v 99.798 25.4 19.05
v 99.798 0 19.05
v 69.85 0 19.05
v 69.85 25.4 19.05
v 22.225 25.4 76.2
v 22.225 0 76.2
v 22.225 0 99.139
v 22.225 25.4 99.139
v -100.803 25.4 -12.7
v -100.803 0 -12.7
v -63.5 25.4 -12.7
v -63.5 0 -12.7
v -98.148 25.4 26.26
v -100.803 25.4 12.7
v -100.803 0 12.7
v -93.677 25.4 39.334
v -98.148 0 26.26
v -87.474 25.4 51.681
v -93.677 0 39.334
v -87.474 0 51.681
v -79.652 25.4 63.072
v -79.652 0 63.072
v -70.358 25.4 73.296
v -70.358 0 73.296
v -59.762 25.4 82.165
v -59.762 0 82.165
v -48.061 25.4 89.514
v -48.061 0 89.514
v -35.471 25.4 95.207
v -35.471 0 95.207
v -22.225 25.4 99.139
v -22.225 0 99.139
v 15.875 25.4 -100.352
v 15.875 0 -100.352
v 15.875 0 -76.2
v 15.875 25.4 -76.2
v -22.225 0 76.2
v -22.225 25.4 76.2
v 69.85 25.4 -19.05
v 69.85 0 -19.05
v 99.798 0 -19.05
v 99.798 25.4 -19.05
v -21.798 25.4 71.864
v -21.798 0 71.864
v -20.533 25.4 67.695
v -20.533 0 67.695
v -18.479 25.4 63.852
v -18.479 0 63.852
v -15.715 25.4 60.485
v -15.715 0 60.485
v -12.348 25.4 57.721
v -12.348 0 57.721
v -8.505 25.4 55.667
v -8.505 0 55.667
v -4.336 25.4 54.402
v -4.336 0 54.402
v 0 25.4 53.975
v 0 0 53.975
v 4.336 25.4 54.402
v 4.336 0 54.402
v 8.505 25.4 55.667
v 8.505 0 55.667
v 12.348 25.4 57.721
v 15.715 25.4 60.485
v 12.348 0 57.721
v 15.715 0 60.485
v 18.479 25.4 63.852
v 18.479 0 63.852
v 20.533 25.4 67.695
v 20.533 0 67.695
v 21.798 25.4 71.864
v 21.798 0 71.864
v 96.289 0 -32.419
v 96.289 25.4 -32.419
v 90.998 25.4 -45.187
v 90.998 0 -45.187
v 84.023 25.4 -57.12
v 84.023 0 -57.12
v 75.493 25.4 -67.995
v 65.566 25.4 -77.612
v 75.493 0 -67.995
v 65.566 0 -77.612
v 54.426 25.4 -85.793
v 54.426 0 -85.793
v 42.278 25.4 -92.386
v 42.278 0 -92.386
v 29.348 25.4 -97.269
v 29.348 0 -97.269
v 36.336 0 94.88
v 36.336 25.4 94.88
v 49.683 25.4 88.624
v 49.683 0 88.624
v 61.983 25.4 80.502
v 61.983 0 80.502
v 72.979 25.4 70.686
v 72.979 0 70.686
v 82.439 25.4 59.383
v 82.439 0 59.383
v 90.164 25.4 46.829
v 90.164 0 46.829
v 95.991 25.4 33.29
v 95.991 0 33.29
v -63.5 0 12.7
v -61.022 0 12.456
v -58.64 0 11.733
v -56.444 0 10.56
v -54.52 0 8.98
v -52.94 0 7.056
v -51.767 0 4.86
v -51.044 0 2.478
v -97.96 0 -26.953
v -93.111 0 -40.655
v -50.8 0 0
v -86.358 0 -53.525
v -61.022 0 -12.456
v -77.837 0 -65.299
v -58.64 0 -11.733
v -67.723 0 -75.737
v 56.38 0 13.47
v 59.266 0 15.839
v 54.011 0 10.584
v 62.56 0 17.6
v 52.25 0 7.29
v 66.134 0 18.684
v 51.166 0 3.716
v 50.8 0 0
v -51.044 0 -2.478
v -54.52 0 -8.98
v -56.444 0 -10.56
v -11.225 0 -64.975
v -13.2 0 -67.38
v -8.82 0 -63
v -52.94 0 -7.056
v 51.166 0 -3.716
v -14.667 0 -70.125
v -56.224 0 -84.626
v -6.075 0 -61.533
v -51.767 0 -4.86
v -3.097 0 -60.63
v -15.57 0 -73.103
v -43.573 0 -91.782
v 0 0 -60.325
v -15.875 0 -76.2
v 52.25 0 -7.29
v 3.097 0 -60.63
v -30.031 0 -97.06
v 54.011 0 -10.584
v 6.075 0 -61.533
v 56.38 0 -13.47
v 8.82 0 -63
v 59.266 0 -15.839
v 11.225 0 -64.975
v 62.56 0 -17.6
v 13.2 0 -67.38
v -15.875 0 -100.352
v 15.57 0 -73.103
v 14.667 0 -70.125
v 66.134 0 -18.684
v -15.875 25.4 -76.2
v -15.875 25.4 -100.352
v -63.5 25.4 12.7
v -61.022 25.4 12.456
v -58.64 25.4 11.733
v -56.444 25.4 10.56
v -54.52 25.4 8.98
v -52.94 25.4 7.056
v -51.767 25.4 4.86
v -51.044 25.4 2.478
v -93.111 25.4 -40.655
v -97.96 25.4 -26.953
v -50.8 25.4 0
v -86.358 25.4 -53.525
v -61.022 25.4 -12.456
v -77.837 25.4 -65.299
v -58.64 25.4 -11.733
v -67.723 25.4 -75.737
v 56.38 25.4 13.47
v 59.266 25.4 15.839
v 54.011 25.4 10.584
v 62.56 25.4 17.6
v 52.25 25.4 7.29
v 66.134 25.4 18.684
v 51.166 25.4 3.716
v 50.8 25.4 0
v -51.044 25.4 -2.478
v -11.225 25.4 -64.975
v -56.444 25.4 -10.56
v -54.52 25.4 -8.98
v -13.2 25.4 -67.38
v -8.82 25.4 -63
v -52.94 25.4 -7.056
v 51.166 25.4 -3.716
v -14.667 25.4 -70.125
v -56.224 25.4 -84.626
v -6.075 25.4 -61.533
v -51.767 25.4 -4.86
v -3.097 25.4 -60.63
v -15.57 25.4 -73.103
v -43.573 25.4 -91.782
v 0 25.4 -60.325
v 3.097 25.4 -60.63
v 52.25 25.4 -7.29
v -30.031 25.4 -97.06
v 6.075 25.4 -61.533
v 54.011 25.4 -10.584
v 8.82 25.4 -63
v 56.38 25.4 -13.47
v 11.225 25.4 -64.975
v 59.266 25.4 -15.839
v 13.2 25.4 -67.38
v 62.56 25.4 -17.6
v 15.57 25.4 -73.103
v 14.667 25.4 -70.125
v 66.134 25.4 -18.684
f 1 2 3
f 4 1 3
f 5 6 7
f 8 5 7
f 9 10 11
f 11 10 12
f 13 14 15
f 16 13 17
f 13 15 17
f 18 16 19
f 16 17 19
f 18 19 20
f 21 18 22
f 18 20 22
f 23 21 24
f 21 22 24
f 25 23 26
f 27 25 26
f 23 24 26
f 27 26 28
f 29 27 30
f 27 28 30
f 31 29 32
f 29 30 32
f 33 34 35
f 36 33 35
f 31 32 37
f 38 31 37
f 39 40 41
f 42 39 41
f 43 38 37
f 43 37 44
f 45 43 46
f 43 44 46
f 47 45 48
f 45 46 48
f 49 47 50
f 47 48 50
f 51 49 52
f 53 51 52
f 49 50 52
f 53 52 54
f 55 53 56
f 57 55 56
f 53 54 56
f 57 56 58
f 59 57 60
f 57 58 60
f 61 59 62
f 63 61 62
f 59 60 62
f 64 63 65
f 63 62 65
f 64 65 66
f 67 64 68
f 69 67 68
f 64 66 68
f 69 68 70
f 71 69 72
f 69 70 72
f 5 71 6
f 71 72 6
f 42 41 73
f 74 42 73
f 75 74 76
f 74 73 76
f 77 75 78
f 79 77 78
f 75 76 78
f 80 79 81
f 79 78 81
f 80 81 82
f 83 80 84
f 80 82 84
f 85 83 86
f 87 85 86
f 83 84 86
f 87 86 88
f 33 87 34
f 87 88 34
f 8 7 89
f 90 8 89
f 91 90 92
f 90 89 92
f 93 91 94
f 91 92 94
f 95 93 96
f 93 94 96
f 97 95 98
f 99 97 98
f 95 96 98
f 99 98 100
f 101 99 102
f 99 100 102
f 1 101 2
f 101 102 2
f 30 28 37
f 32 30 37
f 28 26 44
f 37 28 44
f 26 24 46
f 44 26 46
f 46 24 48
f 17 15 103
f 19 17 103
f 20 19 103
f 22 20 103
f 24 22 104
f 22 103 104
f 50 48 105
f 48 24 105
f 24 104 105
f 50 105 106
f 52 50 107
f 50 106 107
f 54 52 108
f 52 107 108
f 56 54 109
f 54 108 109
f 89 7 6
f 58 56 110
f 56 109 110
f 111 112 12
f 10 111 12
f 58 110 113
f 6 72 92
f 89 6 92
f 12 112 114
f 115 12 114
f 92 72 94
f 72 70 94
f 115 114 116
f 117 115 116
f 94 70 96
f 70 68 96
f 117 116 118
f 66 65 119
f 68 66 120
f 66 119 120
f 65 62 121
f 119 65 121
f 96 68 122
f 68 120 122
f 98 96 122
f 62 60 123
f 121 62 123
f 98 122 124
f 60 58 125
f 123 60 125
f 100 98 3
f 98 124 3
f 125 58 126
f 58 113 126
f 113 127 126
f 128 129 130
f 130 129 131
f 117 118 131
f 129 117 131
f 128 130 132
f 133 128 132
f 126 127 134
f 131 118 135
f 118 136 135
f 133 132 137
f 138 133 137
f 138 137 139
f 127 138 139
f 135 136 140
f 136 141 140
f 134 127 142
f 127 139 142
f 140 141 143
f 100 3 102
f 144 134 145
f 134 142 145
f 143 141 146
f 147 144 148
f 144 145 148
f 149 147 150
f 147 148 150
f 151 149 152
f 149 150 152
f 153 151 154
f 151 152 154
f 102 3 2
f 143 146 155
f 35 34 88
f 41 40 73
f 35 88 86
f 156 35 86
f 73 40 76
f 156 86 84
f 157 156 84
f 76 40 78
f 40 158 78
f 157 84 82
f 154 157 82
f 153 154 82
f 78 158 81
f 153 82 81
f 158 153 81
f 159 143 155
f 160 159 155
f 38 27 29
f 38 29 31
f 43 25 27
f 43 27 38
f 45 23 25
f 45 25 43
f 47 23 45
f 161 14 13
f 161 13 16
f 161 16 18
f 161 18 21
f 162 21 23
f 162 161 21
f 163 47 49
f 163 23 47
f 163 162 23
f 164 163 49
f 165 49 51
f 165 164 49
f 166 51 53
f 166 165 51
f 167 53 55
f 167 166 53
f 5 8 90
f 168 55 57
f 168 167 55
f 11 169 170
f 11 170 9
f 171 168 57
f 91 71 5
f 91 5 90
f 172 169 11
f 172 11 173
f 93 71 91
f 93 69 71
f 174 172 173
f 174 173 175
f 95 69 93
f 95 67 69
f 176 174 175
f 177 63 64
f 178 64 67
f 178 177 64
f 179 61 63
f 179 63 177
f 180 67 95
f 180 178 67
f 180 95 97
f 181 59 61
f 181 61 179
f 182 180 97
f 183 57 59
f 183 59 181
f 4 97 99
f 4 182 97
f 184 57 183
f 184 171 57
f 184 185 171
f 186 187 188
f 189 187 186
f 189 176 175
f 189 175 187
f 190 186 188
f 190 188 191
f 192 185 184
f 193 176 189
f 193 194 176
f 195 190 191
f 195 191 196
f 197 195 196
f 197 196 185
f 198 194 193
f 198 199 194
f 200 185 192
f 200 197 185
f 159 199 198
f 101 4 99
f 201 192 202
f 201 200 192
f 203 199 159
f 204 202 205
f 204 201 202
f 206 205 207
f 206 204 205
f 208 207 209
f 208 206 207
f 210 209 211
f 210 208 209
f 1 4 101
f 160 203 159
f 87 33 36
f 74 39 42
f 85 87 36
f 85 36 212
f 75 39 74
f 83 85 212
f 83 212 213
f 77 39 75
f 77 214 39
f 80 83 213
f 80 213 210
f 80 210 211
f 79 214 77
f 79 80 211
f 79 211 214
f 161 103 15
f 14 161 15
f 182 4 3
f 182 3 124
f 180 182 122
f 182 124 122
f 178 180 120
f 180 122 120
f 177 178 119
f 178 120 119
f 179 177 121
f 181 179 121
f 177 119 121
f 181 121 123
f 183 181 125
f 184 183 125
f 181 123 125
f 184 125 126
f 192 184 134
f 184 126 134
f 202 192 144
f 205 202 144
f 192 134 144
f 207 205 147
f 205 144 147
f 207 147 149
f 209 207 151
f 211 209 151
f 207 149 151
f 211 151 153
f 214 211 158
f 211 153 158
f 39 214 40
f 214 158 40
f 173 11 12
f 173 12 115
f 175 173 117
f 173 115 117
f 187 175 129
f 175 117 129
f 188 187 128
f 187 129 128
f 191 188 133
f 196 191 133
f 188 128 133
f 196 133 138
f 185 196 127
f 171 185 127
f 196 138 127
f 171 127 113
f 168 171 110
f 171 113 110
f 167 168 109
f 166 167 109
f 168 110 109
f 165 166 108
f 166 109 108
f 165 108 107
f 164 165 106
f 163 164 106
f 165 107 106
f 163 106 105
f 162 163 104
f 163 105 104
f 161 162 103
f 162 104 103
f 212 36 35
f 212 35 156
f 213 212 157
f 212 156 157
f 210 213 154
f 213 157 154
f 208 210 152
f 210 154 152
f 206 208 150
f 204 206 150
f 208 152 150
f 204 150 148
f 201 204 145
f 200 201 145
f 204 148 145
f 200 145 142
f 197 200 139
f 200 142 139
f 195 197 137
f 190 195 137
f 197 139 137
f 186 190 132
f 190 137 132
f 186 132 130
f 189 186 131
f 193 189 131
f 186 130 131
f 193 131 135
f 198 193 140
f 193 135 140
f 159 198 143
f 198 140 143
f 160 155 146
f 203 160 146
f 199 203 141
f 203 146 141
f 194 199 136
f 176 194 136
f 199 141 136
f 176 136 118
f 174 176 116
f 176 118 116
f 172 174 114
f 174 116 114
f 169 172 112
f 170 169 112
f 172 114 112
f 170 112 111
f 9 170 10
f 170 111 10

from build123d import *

# Parameters (mm, degrees)
BOSS_EXTRUDE1_DEPTH = 25.4


with BuildPart() as part:
    # Sketch1 → Boss-Extrude1 (new body)
    with BuildSketch(Plane(origin=(0, 0, 0), x_dir=(1, 0, 0), z_dir=(0, 1, 0))):
        with BuildLine():
            ThreePointArc((-100.803124952, -12.7), (-75.179251769, -68.342081498), (-22.225, -99.139343225))
            Line((-22.225, -99.139343225), (-22.225, -76.2))
            ThreePointArc((-22.225, -76.2), (0, -53.975), (22.225, -76.2))
            Line((22.225, -76.2), (22.225, -99.139343225))
            ThreePointArc((22.225, -99.139343225), (72.97933927, -70.686462917), (99.798083649, -19.05))
            Line((99.798083649, -19.05), (69.85, -19.05))
            ThreePointArc((69.85, -19.05), (50.8, 0), (69.85, 19.05))
            Line((69.85, 19.05), (99.798083649, 19.05))
            ThreePointArc((99.798083649, 19.05), (70.693518214, 72.972504977), (15.875, 100.352101996))
            Line((15.875, 100.352101996), (15.875, 76.2))
            ThreePointArc((15.875, 76.2), (0, 60.325), (-15.875, 76.2))
            Line((-15.875, 76.2), (-15.875, 100.352101996))
            ThreePointArc((-15.875, 100.352101996), (-72.966903159, 70.699300162), (-100.803124952, 12.7))
            Line((-100.803124952, 12.7), (-63.5, 12.7))
            ThreePointArc((-63.5, 12.7), (-50.8, 0), (-63.5, -12.7))
            Line((-63.5, -12.7), (-100.803124952, -12.7))
        make_face()
    extrude(amount=BOSS_EXTRUDE1_DEPTH)


solid = part.part
